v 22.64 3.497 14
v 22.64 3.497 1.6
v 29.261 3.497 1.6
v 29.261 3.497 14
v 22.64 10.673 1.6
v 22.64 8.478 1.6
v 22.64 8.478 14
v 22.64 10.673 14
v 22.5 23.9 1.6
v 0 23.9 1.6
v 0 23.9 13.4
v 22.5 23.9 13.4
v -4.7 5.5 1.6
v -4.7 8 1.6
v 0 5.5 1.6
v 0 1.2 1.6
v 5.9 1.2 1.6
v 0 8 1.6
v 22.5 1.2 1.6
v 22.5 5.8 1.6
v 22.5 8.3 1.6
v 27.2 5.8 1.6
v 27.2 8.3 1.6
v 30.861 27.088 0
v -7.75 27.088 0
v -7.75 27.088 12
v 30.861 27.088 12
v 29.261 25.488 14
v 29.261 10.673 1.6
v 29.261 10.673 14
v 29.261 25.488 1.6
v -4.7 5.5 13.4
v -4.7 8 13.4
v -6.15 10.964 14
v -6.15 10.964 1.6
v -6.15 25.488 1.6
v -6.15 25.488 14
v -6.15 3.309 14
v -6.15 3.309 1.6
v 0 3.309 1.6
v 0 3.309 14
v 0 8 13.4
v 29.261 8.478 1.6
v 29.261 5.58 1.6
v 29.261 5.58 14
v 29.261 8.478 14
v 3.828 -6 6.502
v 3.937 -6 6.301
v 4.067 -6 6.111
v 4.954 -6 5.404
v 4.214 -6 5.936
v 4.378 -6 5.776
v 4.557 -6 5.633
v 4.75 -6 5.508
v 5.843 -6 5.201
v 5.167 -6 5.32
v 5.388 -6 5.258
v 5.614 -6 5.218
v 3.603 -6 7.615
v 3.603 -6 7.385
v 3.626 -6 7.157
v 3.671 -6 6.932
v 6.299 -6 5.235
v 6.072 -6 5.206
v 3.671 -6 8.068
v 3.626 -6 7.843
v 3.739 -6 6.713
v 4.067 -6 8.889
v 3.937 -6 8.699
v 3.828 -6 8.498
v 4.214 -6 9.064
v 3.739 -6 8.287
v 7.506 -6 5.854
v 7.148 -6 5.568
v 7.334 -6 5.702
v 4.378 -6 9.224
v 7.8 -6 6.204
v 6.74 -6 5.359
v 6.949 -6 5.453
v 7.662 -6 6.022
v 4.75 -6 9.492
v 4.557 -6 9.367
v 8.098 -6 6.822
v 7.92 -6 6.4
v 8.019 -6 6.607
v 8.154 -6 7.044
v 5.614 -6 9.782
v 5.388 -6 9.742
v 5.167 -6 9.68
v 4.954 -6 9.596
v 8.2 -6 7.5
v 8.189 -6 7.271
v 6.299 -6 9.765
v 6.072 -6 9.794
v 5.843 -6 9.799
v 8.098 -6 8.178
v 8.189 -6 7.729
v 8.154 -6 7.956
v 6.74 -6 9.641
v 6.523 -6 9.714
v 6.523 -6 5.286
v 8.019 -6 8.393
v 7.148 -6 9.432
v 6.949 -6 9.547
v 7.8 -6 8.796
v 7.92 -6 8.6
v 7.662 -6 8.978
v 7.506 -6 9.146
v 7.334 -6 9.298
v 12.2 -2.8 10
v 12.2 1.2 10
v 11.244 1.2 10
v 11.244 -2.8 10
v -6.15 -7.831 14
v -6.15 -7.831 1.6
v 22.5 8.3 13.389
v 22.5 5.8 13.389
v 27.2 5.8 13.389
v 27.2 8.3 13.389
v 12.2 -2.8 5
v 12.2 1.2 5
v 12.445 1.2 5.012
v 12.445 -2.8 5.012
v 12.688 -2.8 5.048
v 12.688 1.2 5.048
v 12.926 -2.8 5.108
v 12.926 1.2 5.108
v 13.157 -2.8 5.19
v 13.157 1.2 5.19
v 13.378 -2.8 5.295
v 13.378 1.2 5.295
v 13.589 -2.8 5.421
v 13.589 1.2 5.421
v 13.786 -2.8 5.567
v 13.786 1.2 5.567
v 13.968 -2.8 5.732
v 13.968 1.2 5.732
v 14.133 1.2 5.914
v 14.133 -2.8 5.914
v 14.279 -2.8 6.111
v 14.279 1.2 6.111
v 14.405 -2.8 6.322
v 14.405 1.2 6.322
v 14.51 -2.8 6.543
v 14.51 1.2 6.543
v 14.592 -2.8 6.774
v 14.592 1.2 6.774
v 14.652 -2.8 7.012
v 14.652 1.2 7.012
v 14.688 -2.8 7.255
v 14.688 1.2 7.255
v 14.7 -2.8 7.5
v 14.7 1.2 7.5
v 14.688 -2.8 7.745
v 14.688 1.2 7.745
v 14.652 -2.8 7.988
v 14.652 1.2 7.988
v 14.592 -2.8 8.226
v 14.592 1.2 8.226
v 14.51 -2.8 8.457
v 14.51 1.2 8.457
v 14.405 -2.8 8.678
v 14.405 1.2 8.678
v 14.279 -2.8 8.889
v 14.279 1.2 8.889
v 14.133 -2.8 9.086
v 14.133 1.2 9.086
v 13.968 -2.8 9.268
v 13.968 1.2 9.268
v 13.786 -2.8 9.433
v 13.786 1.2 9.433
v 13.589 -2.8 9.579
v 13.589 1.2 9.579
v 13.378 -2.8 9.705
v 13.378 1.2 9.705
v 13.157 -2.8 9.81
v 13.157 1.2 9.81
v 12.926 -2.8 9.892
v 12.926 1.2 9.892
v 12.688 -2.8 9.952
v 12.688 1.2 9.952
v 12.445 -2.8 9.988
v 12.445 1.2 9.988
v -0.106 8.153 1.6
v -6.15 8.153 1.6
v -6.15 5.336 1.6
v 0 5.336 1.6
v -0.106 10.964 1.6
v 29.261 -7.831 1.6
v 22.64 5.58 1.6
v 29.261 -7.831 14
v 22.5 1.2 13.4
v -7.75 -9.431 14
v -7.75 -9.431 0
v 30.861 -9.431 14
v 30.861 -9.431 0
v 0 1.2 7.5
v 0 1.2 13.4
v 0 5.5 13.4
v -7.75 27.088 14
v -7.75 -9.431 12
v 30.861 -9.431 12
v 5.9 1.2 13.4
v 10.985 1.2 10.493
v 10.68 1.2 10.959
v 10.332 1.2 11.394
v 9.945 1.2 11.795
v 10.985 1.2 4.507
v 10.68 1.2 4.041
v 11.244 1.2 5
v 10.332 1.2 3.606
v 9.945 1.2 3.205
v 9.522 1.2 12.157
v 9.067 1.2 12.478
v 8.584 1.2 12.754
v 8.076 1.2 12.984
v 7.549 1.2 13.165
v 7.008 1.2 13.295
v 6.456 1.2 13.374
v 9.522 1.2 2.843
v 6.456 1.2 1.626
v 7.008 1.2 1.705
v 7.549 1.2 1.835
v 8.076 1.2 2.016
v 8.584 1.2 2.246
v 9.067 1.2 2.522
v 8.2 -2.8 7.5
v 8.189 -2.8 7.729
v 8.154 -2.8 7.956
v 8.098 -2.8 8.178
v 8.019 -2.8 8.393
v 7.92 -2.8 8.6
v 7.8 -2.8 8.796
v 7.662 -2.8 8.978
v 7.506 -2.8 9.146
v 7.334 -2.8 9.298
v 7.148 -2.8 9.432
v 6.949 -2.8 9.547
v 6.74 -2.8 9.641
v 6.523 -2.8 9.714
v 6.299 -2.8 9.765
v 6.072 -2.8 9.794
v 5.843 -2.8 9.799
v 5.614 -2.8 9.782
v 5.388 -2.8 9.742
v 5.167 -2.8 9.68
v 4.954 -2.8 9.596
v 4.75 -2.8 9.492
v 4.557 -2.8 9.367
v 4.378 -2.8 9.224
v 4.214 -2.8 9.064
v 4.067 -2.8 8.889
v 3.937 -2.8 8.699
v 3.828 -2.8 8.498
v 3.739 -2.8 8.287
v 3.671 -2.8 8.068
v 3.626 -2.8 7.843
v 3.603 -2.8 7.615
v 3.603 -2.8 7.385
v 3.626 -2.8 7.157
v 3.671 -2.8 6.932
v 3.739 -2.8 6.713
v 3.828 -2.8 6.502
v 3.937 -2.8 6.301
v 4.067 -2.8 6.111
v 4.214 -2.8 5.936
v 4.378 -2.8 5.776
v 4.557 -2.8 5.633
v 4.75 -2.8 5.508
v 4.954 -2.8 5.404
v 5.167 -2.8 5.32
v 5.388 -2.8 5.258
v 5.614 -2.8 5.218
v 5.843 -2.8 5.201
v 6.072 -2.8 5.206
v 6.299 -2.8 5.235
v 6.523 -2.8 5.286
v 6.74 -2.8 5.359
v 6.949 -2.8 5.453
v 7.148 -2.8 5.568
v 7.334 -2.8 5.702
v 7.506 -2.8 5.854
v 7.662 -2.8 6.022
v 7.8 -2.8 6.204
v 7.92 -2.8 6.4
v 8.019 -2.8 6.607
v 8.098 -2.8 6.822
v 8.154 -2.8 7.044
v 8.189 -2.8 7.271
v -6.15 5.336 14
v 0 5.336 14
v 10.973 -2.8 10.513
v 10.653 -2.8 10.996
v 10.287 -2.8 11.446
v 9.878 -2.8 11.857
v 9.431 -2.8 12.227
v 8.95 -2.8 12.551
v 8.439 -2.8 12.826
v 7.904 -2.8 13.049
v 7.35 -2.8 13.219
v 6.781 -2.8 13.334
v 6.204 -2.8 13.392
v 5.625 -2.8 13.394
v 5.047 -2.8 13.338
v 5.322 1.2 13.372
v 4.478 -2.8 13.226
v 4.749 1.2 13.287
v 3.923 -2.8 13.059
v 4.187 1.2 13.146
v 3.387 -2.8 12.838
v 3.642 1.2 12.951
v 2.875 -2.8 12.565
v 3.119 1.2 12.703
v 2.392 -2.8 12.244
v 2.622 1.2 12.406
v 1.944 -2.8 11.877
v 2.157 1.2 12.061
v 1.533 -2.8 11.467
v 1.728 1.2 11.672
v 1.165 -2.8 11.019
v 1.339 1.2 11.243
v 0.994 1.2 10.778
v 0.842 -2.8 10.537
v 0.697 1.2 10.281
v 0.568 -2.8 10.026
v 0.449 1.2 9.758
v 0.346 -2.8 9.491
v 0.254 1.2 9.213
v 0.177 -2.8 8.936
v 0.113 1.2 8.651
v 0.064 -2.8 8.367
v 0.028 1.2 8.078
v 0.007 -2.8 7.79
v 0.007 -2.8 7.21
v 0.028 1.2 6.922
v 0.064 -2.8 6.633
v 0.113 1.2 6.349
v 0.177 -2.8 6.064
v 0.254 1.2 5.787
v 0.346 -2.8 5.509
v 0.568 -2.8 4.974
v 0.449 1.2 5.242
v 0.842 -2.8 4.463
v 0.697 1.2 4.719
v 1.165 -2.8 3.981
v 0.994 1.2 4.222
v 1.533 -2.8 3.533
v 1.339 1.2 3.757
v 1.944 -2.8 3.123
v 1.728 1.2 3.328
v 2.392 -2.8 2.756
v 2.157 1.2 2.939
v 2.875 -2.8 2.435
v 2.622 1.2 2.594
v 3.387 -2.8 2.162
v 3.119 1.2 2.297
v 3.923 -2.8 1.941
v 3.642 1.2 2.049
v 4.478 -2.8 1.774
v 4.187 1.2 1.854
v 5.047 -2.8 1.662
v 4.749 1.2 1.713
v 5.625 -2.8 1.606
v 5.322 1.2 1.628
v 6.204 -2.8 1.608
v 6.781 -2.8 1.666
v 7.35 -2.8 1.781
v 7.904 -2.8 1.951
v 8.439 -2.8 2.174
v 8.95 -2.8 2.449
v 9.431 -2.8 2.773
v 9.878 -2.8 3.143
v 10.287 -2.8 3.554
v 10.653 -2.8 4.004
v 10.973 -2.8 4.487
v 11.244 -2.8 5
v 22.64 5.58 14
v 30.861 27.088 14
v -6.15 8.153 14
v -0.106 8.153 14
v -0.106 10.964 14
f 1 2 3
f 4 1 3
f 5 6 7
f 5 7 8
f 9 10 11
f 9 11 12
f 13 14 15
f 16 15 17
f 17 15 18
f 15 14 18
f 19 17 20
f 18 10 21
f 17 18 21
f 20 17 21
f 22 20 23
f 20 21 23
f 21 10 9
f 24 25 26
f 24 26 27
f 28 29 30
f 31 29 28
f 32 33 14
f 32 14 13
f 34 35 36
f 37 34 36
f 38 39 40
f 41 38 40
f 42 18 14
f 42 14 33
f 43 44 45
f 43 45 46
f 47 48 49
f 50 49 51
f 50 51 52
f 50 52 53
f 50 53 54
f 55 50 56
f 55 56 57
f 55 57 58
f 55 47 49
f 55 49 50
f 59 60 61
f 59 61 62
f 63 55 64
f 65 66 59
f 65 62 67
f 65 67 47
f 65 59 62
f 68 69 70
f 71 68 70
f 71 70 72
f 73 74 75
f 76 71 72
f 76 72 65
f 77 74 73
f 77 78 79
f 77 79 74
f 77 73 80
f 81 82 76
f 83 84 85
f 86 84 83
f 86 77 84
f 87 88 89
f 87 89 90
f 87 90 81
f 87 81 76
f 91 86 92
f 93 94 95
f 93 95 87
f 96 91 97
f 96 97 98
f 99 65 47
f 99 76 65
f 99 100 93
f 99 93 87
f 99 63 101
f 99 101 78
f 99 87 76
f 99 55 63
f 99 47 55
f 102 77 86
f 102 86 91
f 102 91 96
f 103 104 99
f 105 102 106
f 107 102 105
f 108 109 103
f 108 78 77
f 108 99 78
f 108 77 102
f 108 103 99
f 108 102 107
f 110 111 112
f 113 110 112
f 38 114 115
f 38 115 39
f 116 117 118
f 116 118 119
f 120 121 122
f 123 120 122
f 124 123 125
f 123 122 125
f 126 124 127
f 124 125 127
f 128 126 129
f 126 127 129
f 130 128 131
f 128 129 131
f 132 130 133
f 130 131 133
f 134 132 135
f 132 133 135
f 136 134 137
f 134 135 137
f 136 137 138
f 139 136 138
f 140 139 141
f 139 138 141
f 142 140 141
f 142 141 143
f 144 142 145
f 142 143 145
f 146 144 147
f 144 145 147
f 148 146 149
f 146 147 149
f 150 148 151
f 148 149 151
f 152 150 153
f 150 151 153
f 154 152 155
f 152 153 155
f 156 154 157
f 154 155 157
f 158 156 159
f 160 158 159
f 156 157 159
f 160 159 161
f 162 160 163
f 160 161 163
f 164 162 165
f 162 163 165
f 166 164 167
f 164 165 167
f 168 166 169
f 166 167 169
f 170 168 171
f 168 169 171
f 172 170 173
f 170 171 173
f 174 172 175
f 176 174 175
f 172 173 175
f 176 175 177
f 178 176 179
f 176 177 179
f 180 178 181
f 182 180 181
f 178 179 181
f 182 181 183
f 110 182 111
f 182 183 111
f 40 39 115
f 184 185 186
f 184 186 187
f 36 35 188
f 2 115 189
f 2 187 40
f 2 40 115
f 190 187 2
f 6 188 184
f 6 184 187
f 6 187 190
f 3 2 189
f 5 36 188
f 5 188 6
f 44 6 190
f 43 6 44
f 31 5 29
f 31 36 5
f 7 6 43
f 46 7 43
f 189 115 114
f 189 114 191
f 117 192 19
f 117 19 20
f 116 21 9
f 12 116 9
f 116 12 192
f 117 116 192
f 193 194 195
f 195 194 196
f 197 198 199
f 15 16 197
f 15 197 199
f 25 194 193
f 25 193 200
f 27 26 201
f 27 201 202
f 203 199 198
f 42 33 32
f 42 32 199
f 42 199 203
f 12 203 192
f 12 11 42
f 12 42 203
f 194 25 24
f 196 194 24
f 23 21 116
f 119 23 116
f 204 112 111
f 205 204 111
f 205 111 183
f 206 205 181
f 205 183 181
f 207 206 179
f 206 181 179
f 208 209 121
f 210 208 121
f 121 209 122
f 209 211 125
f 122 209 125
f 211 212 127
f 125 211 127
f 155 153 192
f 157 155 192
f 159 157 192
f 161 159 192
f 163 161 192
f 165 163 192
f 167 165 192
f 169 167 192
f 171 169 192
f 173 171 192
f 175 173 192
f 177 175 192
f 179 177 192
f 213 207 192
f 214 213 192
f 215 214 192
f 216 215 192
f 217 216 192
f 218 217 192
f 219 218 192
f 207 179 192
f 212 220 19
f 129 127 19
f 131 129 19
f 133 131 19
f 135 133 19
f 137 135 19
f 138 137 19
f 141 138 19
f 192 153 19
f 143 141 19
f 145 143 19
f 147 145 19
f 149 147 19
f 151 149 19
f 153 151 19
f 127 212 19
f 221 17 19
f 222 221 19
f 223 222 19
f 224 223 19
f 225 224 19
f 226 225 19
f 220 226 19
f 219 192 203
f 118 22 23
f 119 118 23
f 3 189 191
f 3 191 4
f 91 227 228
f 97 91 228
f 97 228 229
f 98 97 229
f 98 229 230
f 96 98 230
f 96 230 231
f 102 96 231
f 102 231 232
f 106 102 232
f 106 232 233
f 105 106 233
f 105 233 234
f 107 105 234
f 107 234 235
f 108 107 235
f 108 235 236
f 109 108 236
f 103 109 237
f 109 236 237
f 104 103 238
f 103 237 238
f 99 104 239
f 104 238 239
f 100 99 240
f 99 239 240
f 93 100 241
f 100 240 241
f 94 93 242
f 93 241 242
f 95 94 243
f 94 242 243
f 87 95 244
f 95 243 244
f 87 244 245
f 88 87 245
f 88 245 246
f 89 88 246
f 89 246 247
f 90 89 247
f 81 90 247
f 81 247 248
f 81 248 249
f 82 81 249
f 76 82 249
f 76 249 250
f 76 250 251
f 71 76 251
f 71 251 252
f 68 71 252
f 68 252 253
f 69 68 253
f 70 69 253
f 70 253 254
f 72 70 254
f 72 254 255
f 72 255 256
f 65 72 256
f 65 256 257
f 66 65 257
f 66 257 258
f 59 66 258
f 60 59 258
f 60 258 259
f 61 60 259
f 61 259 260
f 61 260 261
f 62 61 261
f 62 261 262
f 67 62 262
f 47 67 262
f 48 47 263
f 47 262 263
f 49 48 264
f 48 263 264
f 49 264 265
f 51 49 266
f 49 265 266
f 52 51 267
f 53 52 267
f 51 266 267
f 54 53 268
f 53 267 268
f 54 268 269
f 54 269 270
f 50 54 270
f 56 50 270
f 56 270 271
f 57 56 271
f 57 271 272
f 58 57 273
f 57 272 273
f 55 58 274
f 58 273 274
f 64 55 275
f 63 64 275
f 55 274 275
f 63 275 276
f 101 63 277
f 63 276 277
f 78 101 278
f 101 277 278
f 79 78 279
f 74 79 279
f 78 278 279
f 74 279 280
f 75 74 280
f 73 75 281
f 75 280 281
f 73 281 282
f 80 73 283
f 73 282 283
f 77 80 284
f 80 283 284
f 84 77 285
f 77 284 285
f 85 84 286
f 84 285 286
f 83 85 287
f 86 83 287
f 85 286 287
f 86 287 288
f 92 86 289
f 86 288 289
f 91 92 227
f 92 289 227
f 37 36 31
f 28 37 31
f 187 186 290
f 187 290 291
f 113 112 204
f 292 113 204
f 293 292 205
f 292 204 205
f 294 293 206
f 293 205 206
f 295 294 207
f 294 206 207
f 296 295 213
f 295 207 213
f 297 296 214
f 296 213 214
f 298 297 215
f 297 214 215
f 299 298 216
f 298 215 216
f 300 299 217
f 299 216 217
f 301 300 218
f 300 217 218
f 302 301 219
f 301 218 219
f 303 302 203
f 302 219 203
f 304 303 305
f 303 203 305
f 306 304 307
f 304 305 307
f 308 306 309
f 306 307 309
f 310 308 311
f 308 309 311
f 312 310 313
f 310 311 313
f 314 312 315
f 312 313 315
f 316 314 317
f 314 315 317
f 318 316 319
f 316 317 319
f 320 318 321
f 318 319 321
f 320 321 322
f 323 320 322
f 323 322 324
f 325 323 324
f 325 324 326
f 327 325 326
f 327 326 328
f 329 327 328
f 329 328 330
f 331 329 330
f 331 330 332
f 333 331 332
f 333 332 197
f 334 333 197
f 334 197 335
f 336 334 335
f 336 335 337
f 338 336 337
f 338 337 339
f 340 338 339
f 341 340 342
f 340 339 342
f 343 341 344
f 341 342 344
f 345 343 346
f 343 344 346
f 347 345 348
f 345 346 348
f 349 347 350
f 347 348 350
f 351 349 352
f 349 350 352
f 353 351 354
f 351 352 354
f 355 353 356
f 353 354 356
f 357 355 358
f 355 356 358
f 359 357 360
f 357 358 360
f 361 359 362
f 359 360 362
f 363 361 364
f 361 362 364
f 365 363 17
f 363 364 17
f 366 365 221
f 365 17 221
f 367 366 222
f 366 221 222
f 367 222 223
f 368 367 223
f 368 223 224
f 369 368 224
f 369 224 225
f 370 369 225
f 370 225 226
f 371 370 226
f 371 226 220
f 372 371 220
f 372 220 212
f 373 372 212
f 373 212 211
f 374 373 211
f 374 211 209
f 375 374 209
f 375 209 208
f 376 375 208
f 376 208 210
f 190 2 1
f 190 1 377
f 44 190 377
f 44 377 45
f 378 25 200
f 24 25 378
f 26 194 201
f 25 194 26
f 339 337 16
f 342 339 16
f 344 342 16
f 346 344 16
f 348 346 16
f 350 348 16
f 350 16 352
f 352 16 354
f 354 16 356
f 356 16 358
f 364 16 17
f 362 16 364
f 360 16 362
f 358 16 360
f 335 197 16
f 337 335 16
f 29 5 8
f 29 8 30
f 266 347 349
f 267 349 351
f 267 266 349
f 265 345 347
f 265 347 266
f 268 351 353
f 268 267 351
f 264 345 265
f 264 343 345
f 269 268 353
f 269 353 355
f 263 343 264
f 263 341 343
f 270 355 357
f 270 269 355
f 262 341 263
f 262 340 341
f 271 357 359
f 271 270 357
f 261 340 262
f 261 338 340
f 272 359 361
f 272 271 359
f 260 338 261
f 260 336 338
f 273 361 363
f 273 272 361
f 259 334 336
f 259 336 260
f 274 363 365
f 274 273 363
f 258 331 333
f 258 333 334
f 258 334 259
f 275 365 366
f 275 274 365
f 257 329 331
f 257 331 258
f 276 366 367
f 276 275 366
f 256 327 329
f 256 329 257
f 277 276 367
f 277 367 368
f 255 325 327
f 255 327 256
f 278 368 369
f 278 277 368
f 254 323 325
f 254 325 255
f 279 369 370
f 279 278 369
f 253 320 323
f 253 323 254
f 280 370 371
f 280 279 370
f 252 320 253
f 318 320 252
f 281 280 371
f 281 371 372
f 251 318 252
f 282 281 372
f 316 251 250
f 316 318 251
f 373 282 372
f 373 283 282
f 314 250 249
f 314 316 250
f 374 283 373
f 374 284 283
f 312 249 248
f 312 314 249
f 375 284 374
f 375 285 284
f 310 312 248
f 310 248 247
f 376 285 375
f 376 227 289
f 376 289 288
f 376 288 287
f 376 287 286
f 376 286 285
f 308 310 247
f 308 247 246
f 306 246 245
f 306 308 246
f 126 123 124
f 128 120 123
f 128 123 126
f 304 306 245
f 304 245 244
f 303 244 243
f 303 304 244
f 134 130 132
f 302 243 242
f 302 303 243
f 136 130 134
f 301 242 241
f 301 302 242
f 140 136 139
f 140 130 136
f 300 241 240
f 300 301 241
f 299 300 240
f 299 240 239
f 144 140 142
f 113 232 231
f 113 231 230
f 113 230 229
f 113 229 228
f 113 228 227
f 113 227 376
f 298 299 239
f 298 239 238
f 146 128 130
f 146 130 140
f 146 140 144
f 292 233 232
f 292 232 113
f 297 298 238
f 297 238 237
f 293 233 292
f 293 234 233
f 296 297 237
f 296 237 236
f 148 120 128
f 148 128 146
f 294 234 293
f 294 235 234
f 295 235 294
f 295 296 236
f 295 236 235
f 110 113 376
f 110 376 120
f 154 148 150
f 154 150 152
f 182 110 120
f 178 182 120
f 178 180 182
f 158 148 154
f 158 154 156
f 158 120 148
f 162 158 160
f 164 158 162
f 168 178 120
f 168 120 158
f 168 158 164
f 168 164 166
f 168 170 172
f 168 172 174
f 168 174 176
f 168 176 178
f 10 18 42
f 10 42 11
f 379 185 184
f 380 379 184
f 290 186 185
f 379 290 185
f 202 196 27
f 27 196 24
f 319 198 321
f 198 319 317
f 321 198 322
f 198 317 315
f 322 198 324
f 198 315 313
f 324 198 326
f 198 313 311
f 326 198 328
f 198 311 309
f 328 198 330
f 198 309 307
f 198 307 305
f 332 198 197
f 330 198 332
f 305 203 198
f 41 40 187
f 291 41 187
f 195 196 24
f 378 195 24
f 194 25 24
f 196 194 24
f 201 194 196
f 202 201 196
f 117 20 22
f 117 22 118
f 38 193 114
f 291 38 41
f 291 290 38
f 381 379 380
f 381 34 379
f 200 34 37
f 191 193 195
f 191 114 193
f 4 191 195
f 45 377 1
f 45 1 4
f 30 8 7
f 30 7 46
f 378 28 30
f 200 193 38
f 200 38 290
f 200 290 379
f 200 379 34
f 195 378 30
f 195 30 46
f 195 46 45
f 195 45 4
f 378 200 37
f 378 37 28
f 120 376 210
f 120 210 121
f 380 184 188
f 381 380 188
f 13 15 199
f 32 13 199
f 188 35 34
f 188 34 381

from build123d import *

# Parameters (mm, degrees)
SKETCH_W      = 22.5
SKETCH_H      = 22.7
PAD_DEPTH     = 11.8
SKETCH001_W   = 2.5
SKETCH001_H   = 11.788695
PAD001_DEPTH  = 4.7
SKETCH002_W   = 2.5
SKETCH002_H   = 11.8
PAD002_DEPTH  = 4.7
SKETCH004_R   = 5.9
PAD003_DEPTH  = 4
SKETCH005_R   = 2.3
PAD004_DEPTH  = 3.2
PAD005_DEPTH  = 4
SKETCH017_W   = 38.610273
SKETCH017_H   = 36.519459
PAD006_DEPTH  = 14
THICKNESS_T   = -1.6
SKETCH021_W   = 6.043429
SKETCH021_H   = 2.81074
SKETCH021_W_2 = 6.149557
SKETCH021_H_2 = 2.027571
SKETCH021_W_3 = 6.620328
SKETCH021_H_3 = 2.195064
SKETCH021_H_4 = 2.082495
PAD008_DEPTH  = 12.4
SKETCH018_W   = 38.610273
SKETCH018_H   = 36.519459
PAD007_DEPTH  = 12


with BuildPart() as body:
    # Sketch → Pad (new body)
    with BuildSketch(Plane.XY):
        with Locations((11.25, 11.35)):
            Rectangle(SKETCH_W, SKETCH_H)
    extrude(amount=PAD_DEPTH)

    # Sketch001 (on Face2 of Pad) → Pad001 (join)
    with BuildSketch(Plane.YZ.offset(22.5)):
        with Locations((5.85, 5.8943475)):
            Rectangle(SKETCH001_W, SKETCH001_H)
    extrude(amount=PAD001_DEPTH)

    # Sketch002 (on Face2 of Pad001) → Pad002 (join)
    with BuildSketch(Plane(origin=(0, 0, 0), x_dir=(0, -1, 0), z_dir=(-1, 0, 0))):
        with Locations((-5.55, 5.9)):
            Rectangle(SKETCH002_W, SKETCH002_H)
    extrude(amount=PAD002_DEPTH)

    # Sketch004 (on Face1 of Pad002) → Pad003 (join)
    with BuildSketch(Plane.XZ):
        with Locations((5.9, 5.9)):
            Circle(SKETCH004_R)
    extrude(amount=PAD003_DEPTH)

    # Sketch005 (on Face12 of Pad003) → Pad004 (join)
    with BuildSketch(Plane.XZ.offset(4)):
        with Locations((5.9, 5.9)):
            Circle(SKETCH005_R)
    extrude(amount=PAD004_DEPTH)

    # Sketch016 (on Face5 of Pad004) → Pad005 (join)
    with BuildSketch(Plane.XZ):
        with BuildLine():
            ThreePointArc((7.2, 8.4), (4.7, 5.9), (7.2, 3.4))
            Line((7.2, 3.4), (12.2, 3.4))
            ThreePointArc((12.2, 3.4), (14.7, 5.9), (12.2, 8.4))
            Line((12.2, 8.4), (7.2, 8.4))
        make_face()
    extrude(amount=PAD005_DEPTH)


with BuildPart() as body_1:
    # Body placement: moved
    add(body.part.moved(Location((0, 1.2, 1.6))))


with BuildPart() as body001:
    # Sketch017 → Pad006 (new body)
    with BuildSketch(Plane.XY):
        with Locations((11.5555795, 8.8283305)):
            Rectangle(SKETCH017_W, SKETCH017_H)
    extrude(amount=PAD006_DEPTH)

    # Thickness
    thickness_openings = [body001.faces().sort_by_distance(p)[0] for p in [
        (11.55558, 8.828331, 14),
    ]]
    offset(amount=THICKNESS_T, openings=thickness_openings, kind=Kind.INTERSECTION)

    # Sketch021 (on Face11 of Thickness) → Pad008 (join)
    with BuildSketch(Plane.XY.offset(1.6)):
        with Locations((-3.1278425, 9.558409)):
            Rectangle(SKETCH021_W, SKETCH021_H)
        with Locations((-3.0747785, 4.3224895)):
            Rectangle(SKETCH021_W_2, SKETCH021_H_2)
        with Locations((25.950552, 9.575814)):
            Rectangle(SKETCH021_W_3, SKETCH021_H_3)
        with Locations((25.950552, 4.5384255)):
            Rectangle(SKETCH021_W_3, SKETCH021_H_4)
    extrude(amount=PAD008_DEPTH)


with BuildPart() as body002:
    # Sketch018 → Pad007 (new body)
    with BuildSketch(Plane.XY):
        with Locations((11.5555795, 8.8283305)):
            Rectangle(SKETCH018_W, SKETCH018_H)
    extrude(amount=PAD007_DEPTH)


solid = Compound([body_1.part, body001.part, body002.part])
